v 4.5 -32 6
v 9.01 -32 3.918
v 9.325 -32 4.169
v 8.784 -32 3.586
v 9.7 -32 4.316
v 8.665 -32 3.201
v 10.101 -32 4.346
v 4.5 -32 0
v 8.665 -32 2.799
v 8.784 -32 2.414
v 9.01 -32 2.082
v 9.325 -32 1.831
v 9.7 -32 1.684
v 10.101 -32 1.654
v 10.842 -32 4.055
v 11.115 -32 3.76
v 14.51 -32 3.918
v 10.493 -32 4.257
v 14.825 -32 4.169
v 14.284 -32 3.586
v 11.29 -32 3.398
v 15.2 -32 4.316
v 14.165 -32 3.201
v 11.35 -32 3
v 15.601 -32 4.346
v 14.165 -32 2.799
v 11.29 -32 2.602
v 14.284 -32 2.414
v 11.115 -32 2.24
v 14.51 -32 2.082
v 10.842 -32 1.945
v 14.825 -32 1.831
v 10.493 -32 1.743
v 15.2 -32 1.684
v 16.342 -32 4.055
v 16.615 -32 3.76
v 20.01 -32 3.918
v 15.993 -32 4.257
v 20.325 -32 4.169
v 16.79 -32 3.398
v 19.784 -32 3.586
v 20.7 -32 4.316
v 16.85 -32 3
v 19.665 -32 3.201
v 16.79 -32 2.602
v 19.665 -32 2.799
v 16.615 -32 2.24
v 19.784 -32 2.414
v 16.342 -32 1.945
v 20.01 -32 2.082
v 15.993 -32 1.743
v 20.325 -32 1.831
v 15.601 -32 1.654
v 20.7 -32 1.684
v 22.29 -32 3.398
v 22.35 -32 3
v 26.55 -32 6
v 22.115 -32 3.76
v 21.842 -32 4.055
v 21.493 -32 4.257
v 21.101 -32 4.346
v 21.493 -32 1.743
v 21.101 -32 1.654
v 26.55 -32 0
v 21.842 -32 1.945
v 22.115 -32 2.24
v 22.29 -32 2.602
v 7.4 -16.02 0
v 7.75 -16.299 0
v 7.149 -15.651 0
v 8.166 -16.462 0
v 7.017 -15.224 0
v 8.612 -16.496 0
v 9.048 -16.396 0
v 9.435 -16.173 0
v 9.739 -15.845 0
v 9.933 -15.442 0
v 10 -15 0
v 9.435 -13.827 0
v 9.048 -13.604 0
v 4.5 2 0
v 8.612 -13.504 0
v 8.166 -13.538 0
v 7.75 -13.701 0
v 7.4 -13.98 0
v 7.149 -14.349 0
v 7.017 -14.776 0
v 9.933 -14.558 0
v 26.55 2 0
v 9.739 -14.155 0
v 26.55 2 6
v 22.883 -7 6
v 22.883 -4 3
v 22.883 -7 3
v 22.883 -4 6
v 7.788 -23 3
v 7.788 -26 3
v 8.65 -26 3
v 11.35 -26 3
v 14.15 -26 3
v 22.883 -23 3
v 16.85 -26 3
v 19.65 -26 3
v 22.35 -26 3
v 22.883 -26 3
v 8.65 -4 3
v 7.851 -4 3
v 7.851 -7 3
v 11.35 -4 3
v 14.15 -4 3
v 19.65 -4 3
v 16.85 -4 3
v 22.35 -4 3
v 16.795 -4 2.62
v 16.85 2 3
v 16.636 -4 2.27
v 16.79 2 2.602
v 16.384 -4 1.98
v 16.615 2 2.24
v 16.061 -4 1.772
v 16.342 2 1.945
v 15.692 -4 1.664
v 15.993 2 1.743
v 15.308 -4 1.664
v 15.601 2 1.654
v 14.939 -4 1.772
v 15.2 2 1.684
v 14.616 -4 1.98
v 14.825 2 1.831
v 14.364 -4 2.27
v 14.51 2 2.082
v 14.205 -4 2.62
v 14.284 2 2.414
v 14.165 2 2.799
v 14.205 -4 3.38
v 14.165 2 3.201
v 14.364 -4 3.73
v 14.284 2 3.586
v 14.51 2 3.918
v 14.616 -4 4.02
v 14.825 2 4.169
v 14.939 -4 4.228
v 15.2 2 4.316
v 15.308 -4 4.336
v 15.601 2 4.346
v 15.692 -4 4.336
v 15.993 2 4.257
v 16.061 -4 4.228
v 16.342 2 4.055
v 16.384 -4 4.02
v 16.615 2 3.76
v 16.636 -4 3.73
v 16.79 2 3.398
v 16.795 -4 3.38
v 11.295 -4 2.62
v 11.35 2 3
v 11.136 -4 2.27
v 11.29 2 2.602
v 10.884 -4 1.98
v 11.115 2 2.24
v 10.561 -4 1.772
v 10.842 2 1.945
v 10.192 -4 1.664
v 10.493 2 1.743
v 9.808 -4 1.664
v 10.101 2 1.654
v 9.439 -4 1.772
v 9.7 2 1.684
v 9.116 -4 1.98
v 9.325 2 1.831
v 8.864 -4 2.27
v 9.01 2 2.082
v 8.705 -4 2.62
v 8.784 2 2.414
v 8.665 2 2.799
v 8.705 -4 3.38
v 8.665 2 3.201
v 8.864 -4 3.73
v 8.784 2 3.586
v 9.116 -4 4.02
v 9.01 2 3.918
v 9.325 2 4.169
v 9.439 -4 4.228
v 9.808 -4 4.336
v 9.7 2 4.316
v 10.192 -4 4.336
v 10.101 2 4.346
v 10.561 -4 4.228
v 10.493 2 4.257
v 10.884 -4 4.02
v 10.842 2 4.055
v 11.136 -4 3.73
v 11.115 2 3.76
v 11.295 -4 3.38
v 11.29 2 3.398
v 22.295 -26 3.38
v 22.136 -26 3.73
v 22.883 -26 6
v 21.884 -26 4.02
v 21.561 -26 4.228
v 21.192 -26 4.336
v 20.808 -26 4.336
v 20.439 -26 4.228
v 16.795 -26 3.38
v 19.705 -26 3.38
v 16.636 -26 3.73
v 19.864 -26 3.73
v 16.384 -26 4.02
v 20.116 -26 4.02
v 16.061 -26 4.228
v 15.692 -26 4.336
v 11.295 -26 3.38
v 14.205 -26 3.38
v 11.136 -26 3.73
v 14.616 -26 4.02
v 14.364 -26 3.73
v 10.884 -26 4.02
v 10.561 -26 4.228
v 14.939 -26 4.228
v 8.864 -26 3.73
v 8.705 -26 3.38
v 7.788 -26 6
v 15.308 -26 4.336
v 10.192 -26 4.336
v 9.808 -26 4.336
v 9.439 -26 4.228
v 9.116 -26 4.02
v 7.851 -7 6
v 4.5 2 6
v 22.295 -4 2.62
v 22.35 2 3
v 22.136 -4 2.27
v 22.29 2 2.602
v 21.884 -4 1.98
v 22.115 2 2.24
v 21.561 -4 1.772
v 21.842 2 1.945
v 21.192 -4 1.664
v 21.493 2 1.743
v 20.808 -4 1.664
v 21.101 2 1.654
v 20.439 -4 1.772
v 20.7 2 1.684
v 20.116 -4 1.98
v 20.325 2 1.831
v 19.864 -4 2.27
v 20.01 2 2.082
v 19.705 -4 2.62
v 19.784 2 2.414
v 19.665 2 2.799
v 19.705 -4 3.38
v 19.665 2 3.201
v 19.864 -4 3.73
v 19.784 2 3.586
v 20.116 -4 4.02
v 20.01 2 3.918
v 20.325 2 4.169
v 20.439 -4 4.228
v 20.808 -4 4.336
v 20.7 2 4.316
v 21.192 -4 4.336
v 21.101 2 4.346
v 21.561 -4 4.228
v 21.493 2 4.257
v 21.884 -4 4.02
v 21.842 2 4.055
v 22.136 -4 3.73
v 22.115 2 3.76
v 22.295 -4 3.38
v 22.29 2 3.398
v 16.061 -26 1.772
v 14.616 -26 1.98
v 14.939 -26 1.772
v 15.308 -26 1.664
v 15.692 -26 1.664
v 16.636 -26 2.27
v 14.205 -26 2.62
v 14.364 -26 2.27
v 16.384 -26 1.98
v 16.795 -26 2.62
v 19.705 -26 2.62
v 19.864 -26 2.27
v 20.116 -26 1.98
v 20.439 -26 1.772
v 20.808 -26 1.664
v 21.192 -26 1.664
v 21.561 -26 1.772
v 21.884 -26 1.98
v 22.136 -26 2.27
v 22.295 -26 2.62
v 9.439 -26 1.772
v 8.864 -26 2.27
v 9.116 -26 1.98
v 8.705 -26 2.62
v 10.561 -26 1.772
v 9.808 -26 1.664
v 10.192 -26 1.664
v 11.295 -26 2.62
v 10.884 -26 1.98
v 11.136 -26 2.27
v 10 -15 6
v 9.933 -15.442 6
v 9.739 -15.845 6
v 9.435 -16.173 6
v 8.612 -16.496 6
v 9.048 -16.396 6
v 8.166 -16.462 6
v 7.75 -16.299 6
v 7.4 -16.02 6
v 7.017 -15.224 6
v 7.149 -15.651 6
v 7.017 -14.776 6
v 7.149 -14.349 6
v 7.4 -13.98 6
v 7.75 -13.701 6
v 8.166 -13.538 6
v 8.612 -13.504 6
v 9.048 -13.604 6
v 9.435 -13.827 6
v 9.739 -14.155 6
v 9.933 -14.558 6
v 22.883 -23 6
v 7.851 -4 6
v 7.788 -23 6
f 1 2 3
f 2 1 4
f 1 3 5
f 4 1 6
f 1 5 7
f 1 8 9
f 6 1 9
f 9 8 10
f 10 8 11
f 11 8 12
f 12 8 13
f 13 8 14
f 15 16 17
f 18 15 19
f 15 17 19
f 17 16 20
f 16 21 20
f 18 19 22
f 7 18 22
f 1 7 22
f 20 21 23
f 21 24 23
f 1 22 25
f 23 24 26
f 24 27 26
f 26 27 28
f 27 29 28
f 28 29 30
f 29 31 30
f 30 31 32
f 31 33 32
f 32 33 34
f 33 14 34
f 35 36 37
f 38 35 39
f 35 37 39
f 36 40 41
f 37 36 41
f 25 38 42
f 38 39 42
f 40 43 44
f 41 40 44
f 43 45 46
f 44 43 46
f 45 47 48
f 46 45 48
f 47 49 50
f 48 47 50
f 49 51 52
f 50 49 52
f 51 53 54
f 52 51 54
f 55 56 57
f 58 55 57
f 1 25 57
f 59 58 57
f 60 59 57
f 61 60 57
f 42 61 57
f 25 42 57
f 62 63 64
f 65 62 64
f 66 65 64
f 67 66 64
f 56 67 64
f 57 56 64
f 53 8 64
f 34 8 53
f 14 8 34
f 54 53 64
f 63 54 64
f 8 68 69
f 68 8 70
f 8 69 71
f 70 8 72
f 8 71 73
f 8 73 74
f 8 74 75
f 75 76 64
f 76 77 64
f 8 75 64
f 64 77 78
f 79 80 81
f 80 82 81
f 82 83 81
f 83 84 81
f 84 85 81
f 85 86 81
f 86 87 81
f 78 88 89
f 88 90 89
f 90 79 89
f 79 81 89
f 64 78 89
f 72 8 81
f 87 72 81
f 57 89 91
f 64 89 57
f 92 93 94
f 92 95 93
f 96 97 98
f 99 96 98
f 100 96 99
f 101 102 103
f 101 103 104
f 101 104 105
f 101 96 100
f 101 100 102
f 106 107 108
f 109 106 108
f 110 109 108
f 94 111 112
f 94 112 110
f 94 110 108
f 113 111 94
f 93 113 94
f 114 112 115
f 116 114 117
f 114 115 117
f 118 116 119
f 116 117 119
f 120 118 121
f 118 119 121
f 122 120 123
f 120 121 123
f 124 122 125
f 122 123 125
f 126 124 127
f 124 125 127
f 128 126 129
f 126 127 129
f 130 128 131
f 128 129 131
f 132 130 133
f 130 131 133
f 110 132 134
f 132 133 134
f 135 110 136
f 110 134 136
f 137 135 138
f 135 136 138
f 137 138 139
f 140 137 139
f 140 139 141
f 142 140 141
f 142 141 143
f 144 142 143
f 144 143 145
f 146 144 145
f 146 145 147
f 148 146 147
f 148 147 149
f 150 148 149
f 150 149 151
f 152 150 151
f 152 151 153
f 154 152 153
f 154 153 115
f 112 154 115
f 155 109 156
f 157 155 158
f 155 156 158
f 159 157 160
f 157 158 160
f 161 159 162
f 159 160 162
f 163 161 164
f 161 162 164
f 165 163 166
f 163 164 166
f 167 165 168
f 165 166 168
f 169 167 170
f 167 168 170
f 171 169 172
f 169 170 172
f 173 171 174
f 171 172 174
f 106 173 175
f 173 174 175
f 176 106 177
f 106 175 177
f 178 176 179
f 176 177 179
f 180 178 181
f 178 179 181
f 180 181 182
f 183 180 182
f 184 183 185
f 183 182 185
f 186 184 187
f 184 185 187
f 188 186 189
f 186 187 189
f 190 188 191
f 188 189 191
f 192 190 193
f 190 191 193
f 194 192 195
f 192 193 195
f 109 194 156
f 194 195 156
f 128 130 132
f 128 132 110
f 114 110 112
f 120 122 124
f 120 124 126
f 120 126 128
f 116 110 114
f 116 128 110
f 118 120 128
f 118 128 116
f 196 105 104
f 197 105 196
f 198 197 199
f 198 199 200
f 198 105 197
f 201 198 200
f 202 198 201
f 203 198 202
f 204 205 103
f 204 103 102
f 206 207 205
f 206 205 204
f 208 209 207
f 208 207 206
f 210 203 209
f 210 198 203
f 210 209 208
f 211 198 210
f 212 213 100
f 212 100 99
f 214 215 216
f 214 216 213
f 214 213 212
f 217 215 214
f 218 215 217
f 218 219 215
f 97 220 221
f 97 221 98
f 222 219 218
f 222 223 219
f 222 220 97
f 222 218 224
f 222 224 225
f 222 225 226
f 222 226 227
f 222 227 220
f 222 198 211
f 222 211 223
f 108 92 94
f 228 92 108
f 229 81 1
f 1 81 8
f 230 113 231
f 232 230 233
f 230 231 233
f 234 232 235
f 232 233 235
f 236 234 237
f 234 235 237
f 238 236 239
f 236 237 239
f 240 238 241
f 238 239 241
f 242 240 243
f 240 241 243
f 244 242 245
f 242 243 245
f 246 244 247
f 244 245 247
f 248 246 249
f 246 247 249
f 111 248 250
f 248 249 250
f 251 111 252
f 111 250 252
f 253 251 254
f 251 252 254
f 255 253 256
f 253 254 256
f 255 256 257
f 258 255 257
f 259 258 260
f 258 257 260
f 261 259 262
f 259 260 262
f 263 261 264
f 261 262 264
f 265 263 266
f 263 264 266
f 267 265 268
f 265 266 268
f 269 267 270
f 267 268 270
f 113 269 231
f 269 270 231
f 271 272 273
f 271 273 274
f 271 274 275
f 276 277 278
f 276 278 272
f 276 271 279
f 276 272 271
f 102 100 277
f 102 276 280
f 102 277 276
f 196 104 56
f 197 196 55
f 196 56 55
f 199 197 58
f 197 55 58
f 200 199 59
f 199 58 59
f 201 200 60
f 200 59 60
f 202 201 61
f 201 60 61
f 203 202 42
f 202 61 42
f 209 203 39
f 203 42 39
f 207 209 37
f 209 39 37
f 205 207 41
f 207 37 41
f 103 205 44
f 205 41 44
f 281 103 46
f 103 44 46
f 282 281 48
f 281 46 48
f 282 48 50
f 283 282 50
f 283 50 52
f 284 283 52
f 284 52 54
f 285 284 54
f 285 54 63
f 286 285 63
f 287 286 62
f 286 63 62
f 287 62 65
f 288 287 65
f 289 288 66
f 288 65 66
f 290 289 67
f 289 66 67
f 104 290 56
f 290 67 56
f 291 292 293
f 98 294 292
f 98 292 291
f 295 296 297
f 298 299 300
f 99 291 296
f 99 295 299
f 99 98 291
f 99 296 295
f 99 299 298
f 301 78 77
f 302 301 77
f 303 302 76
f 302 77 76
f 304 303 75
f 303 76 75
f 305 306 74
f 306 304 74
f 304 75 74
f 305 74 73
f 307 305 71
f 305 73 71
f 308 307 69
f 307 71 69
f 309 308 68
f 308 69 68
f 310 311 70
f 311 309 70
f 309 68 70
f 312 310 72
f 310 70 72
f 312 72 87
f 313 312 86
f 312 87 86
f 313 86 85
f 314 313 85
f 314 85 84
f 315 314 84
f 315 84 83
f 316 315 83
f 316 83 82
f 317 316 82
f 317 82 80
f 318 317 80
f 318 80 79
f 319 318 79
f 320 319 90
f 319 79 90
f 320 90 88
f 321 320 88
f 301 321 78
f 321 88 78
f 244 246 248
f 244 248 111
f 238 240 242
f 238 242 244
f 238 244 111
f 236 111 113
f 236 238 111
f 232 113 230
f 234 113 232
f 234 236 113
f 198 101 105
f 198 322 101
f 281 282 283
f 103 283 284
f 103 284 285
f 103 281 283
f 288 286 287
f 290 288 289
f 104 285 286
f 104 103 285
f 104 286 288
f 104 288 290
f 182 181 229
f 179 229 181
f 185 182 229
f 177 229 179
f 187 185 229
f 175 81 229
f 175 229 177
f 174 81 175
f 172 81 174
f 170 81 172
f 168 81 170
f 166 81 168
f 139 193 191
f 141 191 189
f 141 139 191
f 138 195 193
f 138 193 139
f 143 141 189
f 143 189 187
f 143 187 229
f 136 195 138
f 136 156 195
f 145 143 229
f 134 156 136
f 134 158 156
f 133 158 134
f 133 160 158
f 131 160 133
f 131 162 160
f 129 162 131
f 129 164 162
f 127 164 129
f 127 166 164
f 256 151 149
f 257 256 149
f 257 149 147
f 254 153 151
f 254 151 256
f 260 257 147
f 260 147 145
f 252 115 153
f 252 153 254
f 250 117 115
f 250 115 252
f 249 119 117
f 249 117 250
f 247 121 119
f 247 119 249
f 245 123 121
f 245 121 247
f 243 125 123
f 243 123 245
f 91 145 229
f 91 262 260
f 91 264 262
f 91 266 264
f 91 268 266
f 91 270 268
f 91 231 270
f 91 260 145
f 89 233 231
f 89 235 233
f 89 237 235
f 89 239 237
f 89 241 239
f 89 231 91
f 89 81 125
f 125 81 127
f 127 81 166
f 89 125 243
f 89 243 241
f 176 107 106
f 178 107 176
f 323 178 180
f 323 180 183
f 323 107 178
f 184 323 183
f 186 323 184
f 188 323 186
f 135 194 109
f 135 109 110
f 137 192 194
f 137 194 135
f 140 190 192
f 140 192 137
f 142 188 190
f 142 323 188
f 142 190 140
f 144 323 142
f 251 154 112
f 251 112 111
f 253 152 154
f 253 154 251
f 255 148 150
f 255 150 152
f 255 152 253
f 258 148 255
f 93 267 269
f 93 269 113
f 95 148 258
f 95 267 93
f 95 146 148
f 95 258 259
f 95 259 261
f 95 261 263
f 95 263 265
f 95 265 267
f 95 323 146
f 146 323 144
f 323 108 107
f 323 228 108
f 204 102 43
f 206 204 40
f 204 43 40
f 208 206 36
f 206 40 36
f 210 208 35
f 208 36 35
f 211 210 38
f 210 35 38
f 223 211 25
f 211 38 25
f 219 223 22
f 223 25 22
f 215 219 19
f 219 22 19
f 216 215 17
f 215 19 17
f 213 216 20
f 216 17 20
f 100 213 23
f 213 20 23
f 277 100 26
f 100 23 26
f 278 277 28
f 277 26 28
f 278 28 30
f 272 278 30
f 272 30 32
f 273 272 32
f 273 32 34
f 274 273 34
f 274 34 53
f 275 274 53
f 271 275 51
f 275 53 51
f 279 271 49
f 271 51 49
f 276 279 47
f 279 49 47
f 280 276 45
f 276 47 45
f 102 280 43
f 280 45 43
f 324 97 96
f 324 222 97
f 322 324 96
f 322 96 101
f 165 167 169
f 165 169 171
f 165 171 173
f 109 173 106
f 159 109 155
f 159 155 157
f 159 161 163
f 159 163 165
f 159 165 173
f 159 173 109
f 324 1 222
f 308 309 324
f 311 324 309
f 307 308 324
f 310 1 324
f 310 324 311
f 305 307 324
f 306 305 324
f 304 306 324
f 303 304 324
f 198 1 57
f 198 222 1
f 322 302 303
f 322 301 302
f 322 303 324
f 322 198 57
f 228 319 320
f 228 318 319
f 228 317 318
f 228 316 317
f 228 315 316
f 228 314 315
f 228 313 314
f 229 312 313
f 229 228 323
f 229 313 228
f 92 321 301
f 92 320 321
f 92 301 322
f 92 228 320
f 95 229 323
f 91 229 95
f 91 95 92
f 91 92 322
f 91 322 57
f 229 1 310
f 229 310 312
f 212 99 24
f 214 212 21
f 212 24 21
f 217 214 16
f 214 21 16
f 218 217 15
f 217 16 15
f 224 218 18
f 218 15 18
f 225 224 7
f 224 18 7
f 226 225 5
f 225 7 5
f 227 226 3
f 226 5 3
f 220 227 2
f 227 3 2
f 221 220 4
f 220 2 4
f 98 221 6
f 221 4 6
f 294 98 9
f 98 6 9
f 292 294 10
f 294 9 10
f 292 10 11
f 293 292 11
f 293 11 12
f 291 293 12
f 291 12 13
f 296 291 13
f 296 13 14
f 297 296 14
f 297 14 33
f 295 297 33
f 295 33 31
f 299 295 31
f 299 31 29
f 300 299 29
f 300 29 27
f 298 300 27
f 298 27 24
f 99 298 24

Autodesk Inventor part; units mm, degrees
ref_plane "YZ Plane" through (0, 0, 0) normal (1, 0, 0) x (0, 1, 0)
ref_plane "XZ Plane" through (0, 0, 0) normal (0, 1, 0) x (-1, 0, 0)
ref_plane "XY Plane" through (0, 0, 0) normal (0, 0, 1) x (1, 0, 0)
sketch "스케치1" plane through (0, 0, 0) normal (0, 0, 1) x (1, 0, 0)
  line L0 (28.5, 0) -> (46.5, 0) projected
  line L1 (46.5, 0) -> (46.5, -1.5) projected
  line L2 (50.5, -1.5) -> (46.5, -1.5) projected
  line L3 (50.5, 0) -> (50.5, -1.5) projected
  line L4 (50.5, 0) -> (53.1, 0) projected
  line L5 (53.1, 0) -> (53.1, 2) projected
  line L6 (0, 2) -> (53.1, 2) projected
  line L7 (0, 0) -> (0, 2) projected
  line L8 (0, 0) -> (2.5, 0) projected
  line L9 (2.5, 0) -> (2.5, -1.5) projected
  line L10 (6.5, -1.5) -> (2.5, -1.5) projected
  line L11 (6.5, 0) -> (6.5, -1.5) projected
  line L12 (6.5, 0) -> (24.5, 0) projected
  line L13 (24.5, 0) -> (24.5, -1.5) projected
  line L14 (28.5, -1.5) -> (24.5, -1.5) projected
  line L15 (28.5, 0) -> (28.5, -1.5) projected
  line L16 (8.475, -27.5) -> (6.975, -27.5) projected
  line L17 (6.975, -27.5) -> (6.975, -29.5) projected
  line L18 (6.975, -29.5) -> (2.025, -29.5) projected
  line L19 (2.025, -27.5) -> (2.025, -29.5) projected
  line L20 (2.025, -27.5) -> (0.525, -27.5) projected
  line L21 (0.525, -27.5) -> (0.525, -30) projected
  line L22 (0, -30) -> (0.525, -30) projected
  line L23 (0, -30) -> (0, -32) projected
  line L24 (0, -32) -> (53.1, -32) projected
  line L25 (53.1, -30) -> (53.1, -32) projected
  line L26 (52.475, -30) -> (53.1, -30) projected
  line L27 (52.475, -30) -> (52.475, -27.5) projected
  line L28 (52.475, -27.5) -> (50.975, -27.5) projected
  line L29 (50.975, -27.5) -> (50.975, -29.5) projected
  line L30 (50.975, -29.5) -> (46.025, -29.5) projected
  line L31 (46.025, -27.5) -> (46.025, -29.5) projected
  line L32 (46.025, -27.5) -> (44.525, -27.5) projected
  line L33 (44.525, -27.5) -> (44.525, -30) projected
  line L34 (30.475, -30) -> (44.525, -30) projected
  line L35 (30.475, -30) -> (30.475, -27.5) projected
  line L36 (30.475, -27.5) -> (28.975, -27.5) projected
  line L37 (28.975, -27.5) -> (28.975, -29.5) projected
  line L38 (28.975, -29.5) -> (24.025, -29.5) projected
  line L39 (24.025, -27.5) -> (24.025, -29.5) projected
  line L40 (24.025, -27.5) -> (22.525, -27.5) projected
  line L41 (22.525, -27.5) -> (22.525, -30) projected
  line L42 (8.475, -30) -> (22.525, -30) projected
  line L43 (8.475, -30) -> (8.475, -27.5) projected
  line L44 (48.1766, 5.1) -> (3.9234, 5.1) projected
  line L45 (29.3, 2) -> (29.3, 8)
  line L46 (3.15, 8) -> (3.15, 2)
  line L47 (1.7, -38) -> (1.7, -32)
  line L48 (29.3, -38) -> (29.3, -32)
  line L49 (15.5, 2) -> (15.5, -15)
  circle A0 centre (8.5, -15) radius 1.5 projected
  line L50 (26.55, 2) -> (26.55, -32)
  line L51 (4.5, 2) -> (4.5, -32)
  dimension "d0" = 17
extrude "돌출1" add sketch "스케치1" along normal blind 6 contours L50 L38 L39 L40 L41 L42 L43 L16 L17 L18 L51 L10 L11 L12 L13 L14 | L14 L13 L12 L49 L6 L50 | L50 L24 L51 L18 L17 L16 L43 L42 L41 L40 L39 L38 | L49 L12 L11 L10 L51 L6
sketch "스케치2" plane through (4.5, 2, 0) normal (0, 1, 0) x (1, 0, 0)
  arc A0 (22, 0) -> (22, 5.6) centre (22, 2.8) ccw projected
  line L0 (22, 5.6) -> (0, 5.6) projected
  arc A1 (0, 5.6) -> (0, 0) centre (0, 2.8) ccw projected
  line L1 (0, 0) -> (0, -6) projected
  line L2 (0, -6) -> (22, -6) projected
  line L3 (22, -6) -> (22, 0) projected
  circle A2 centre (11, -3) radius 1.35 projected
  circle A3 centre (16.5, -3) radius 1.35 projected
  circle A4 centre (0, 2.8) radius 1.35 projected
  circle A5 centre (22, 2.8) radius 1.35 projected
  circle A6 centre (5.5, -3) radius 1.35 projected
  point P0 (-4.5, 0)
extrude "돌출2" cut sketch "스케치2" against normal blind 6 contours A2 | A3 | A6
sketch "스케치3" plane through (4.5, -32, 0) normal (0, -1, 0) x (1, 0, 0)
  arc A0 (22, -5.6) -> (22, 0) centre (22, -2.8) ccw projected
  line L0 (22, 6) -> (22, 0) projected
  line L1 (0, 6) -> (22, 6) projected
  line L2 (0, 0) -> (0, 6) projected
  arc A1 (0, 0) -> (0, -5.6) centre (0, -2.8) ccw projected
  line L3 (22, -5.6) -> (0, -5.6) projected
  circle A2 centre (11, 3) radius 1.35 projected
  circle A3 centre (16.5, 3) radius 1.35 projected
  circle A4 centre (0, -2.8) radius 1.35 projected
  circle A5 centre (22, -2.8) radius 1.35 projected
  circle A6 centre (5.5, 3) radius 1.35 projected
  point P0 (-4.5, 0)
extrude "돌출3" cut sketch "스케치3" against normal blind 6 contours A2 | A3 | A6
sketch "스케치4" plane through (0, 0, 6) normal (0, 0, 1) x (1, 0, 0)
  line L0 (19.65, -4) -> (22.35, -4) projected
  line L1 (14.15, -4) -> (16.85, -4) projected
  line L2 (8.65, -4) -> (11.35, -4) projected
  line L3 (22.35, -26) -> (19.65, -26) projected
  line L4 (16.85, -26) -> (14.15, -26) projected
  line L5 (11.35, -26) -> (8.65, -26) projected
  line L6 (22.883, -4) -> (22.883, -7)
  line L7 (22.883, -7) -> (7.8508, -7)
  line L8 (7.8508, -7) -> (7.8508, -4)
  line L9 (7.8508, -4) -> (22.883, -4)
  line L10 (22.883, -23) -> (22.883, -26)
  line L11 (22.883, -26) -> (7.788, -26)
  line L12 (7.788, -26) -> (7.788, -23)
  line L13 (7.788, -23) -> (22.883, -23)
  line L14 (8.65, -32) -> (8.65, -26) projected
  line L15 (8.65, 2) -> (8.65, -4) projected
  point P0 (0, 0)
  dimension "d7" = 3
  dimension "d8" = 3
extrude "돌출4" cut sketch "스케치4" against normal blind 3
properties part number "_adle_adt_2"
